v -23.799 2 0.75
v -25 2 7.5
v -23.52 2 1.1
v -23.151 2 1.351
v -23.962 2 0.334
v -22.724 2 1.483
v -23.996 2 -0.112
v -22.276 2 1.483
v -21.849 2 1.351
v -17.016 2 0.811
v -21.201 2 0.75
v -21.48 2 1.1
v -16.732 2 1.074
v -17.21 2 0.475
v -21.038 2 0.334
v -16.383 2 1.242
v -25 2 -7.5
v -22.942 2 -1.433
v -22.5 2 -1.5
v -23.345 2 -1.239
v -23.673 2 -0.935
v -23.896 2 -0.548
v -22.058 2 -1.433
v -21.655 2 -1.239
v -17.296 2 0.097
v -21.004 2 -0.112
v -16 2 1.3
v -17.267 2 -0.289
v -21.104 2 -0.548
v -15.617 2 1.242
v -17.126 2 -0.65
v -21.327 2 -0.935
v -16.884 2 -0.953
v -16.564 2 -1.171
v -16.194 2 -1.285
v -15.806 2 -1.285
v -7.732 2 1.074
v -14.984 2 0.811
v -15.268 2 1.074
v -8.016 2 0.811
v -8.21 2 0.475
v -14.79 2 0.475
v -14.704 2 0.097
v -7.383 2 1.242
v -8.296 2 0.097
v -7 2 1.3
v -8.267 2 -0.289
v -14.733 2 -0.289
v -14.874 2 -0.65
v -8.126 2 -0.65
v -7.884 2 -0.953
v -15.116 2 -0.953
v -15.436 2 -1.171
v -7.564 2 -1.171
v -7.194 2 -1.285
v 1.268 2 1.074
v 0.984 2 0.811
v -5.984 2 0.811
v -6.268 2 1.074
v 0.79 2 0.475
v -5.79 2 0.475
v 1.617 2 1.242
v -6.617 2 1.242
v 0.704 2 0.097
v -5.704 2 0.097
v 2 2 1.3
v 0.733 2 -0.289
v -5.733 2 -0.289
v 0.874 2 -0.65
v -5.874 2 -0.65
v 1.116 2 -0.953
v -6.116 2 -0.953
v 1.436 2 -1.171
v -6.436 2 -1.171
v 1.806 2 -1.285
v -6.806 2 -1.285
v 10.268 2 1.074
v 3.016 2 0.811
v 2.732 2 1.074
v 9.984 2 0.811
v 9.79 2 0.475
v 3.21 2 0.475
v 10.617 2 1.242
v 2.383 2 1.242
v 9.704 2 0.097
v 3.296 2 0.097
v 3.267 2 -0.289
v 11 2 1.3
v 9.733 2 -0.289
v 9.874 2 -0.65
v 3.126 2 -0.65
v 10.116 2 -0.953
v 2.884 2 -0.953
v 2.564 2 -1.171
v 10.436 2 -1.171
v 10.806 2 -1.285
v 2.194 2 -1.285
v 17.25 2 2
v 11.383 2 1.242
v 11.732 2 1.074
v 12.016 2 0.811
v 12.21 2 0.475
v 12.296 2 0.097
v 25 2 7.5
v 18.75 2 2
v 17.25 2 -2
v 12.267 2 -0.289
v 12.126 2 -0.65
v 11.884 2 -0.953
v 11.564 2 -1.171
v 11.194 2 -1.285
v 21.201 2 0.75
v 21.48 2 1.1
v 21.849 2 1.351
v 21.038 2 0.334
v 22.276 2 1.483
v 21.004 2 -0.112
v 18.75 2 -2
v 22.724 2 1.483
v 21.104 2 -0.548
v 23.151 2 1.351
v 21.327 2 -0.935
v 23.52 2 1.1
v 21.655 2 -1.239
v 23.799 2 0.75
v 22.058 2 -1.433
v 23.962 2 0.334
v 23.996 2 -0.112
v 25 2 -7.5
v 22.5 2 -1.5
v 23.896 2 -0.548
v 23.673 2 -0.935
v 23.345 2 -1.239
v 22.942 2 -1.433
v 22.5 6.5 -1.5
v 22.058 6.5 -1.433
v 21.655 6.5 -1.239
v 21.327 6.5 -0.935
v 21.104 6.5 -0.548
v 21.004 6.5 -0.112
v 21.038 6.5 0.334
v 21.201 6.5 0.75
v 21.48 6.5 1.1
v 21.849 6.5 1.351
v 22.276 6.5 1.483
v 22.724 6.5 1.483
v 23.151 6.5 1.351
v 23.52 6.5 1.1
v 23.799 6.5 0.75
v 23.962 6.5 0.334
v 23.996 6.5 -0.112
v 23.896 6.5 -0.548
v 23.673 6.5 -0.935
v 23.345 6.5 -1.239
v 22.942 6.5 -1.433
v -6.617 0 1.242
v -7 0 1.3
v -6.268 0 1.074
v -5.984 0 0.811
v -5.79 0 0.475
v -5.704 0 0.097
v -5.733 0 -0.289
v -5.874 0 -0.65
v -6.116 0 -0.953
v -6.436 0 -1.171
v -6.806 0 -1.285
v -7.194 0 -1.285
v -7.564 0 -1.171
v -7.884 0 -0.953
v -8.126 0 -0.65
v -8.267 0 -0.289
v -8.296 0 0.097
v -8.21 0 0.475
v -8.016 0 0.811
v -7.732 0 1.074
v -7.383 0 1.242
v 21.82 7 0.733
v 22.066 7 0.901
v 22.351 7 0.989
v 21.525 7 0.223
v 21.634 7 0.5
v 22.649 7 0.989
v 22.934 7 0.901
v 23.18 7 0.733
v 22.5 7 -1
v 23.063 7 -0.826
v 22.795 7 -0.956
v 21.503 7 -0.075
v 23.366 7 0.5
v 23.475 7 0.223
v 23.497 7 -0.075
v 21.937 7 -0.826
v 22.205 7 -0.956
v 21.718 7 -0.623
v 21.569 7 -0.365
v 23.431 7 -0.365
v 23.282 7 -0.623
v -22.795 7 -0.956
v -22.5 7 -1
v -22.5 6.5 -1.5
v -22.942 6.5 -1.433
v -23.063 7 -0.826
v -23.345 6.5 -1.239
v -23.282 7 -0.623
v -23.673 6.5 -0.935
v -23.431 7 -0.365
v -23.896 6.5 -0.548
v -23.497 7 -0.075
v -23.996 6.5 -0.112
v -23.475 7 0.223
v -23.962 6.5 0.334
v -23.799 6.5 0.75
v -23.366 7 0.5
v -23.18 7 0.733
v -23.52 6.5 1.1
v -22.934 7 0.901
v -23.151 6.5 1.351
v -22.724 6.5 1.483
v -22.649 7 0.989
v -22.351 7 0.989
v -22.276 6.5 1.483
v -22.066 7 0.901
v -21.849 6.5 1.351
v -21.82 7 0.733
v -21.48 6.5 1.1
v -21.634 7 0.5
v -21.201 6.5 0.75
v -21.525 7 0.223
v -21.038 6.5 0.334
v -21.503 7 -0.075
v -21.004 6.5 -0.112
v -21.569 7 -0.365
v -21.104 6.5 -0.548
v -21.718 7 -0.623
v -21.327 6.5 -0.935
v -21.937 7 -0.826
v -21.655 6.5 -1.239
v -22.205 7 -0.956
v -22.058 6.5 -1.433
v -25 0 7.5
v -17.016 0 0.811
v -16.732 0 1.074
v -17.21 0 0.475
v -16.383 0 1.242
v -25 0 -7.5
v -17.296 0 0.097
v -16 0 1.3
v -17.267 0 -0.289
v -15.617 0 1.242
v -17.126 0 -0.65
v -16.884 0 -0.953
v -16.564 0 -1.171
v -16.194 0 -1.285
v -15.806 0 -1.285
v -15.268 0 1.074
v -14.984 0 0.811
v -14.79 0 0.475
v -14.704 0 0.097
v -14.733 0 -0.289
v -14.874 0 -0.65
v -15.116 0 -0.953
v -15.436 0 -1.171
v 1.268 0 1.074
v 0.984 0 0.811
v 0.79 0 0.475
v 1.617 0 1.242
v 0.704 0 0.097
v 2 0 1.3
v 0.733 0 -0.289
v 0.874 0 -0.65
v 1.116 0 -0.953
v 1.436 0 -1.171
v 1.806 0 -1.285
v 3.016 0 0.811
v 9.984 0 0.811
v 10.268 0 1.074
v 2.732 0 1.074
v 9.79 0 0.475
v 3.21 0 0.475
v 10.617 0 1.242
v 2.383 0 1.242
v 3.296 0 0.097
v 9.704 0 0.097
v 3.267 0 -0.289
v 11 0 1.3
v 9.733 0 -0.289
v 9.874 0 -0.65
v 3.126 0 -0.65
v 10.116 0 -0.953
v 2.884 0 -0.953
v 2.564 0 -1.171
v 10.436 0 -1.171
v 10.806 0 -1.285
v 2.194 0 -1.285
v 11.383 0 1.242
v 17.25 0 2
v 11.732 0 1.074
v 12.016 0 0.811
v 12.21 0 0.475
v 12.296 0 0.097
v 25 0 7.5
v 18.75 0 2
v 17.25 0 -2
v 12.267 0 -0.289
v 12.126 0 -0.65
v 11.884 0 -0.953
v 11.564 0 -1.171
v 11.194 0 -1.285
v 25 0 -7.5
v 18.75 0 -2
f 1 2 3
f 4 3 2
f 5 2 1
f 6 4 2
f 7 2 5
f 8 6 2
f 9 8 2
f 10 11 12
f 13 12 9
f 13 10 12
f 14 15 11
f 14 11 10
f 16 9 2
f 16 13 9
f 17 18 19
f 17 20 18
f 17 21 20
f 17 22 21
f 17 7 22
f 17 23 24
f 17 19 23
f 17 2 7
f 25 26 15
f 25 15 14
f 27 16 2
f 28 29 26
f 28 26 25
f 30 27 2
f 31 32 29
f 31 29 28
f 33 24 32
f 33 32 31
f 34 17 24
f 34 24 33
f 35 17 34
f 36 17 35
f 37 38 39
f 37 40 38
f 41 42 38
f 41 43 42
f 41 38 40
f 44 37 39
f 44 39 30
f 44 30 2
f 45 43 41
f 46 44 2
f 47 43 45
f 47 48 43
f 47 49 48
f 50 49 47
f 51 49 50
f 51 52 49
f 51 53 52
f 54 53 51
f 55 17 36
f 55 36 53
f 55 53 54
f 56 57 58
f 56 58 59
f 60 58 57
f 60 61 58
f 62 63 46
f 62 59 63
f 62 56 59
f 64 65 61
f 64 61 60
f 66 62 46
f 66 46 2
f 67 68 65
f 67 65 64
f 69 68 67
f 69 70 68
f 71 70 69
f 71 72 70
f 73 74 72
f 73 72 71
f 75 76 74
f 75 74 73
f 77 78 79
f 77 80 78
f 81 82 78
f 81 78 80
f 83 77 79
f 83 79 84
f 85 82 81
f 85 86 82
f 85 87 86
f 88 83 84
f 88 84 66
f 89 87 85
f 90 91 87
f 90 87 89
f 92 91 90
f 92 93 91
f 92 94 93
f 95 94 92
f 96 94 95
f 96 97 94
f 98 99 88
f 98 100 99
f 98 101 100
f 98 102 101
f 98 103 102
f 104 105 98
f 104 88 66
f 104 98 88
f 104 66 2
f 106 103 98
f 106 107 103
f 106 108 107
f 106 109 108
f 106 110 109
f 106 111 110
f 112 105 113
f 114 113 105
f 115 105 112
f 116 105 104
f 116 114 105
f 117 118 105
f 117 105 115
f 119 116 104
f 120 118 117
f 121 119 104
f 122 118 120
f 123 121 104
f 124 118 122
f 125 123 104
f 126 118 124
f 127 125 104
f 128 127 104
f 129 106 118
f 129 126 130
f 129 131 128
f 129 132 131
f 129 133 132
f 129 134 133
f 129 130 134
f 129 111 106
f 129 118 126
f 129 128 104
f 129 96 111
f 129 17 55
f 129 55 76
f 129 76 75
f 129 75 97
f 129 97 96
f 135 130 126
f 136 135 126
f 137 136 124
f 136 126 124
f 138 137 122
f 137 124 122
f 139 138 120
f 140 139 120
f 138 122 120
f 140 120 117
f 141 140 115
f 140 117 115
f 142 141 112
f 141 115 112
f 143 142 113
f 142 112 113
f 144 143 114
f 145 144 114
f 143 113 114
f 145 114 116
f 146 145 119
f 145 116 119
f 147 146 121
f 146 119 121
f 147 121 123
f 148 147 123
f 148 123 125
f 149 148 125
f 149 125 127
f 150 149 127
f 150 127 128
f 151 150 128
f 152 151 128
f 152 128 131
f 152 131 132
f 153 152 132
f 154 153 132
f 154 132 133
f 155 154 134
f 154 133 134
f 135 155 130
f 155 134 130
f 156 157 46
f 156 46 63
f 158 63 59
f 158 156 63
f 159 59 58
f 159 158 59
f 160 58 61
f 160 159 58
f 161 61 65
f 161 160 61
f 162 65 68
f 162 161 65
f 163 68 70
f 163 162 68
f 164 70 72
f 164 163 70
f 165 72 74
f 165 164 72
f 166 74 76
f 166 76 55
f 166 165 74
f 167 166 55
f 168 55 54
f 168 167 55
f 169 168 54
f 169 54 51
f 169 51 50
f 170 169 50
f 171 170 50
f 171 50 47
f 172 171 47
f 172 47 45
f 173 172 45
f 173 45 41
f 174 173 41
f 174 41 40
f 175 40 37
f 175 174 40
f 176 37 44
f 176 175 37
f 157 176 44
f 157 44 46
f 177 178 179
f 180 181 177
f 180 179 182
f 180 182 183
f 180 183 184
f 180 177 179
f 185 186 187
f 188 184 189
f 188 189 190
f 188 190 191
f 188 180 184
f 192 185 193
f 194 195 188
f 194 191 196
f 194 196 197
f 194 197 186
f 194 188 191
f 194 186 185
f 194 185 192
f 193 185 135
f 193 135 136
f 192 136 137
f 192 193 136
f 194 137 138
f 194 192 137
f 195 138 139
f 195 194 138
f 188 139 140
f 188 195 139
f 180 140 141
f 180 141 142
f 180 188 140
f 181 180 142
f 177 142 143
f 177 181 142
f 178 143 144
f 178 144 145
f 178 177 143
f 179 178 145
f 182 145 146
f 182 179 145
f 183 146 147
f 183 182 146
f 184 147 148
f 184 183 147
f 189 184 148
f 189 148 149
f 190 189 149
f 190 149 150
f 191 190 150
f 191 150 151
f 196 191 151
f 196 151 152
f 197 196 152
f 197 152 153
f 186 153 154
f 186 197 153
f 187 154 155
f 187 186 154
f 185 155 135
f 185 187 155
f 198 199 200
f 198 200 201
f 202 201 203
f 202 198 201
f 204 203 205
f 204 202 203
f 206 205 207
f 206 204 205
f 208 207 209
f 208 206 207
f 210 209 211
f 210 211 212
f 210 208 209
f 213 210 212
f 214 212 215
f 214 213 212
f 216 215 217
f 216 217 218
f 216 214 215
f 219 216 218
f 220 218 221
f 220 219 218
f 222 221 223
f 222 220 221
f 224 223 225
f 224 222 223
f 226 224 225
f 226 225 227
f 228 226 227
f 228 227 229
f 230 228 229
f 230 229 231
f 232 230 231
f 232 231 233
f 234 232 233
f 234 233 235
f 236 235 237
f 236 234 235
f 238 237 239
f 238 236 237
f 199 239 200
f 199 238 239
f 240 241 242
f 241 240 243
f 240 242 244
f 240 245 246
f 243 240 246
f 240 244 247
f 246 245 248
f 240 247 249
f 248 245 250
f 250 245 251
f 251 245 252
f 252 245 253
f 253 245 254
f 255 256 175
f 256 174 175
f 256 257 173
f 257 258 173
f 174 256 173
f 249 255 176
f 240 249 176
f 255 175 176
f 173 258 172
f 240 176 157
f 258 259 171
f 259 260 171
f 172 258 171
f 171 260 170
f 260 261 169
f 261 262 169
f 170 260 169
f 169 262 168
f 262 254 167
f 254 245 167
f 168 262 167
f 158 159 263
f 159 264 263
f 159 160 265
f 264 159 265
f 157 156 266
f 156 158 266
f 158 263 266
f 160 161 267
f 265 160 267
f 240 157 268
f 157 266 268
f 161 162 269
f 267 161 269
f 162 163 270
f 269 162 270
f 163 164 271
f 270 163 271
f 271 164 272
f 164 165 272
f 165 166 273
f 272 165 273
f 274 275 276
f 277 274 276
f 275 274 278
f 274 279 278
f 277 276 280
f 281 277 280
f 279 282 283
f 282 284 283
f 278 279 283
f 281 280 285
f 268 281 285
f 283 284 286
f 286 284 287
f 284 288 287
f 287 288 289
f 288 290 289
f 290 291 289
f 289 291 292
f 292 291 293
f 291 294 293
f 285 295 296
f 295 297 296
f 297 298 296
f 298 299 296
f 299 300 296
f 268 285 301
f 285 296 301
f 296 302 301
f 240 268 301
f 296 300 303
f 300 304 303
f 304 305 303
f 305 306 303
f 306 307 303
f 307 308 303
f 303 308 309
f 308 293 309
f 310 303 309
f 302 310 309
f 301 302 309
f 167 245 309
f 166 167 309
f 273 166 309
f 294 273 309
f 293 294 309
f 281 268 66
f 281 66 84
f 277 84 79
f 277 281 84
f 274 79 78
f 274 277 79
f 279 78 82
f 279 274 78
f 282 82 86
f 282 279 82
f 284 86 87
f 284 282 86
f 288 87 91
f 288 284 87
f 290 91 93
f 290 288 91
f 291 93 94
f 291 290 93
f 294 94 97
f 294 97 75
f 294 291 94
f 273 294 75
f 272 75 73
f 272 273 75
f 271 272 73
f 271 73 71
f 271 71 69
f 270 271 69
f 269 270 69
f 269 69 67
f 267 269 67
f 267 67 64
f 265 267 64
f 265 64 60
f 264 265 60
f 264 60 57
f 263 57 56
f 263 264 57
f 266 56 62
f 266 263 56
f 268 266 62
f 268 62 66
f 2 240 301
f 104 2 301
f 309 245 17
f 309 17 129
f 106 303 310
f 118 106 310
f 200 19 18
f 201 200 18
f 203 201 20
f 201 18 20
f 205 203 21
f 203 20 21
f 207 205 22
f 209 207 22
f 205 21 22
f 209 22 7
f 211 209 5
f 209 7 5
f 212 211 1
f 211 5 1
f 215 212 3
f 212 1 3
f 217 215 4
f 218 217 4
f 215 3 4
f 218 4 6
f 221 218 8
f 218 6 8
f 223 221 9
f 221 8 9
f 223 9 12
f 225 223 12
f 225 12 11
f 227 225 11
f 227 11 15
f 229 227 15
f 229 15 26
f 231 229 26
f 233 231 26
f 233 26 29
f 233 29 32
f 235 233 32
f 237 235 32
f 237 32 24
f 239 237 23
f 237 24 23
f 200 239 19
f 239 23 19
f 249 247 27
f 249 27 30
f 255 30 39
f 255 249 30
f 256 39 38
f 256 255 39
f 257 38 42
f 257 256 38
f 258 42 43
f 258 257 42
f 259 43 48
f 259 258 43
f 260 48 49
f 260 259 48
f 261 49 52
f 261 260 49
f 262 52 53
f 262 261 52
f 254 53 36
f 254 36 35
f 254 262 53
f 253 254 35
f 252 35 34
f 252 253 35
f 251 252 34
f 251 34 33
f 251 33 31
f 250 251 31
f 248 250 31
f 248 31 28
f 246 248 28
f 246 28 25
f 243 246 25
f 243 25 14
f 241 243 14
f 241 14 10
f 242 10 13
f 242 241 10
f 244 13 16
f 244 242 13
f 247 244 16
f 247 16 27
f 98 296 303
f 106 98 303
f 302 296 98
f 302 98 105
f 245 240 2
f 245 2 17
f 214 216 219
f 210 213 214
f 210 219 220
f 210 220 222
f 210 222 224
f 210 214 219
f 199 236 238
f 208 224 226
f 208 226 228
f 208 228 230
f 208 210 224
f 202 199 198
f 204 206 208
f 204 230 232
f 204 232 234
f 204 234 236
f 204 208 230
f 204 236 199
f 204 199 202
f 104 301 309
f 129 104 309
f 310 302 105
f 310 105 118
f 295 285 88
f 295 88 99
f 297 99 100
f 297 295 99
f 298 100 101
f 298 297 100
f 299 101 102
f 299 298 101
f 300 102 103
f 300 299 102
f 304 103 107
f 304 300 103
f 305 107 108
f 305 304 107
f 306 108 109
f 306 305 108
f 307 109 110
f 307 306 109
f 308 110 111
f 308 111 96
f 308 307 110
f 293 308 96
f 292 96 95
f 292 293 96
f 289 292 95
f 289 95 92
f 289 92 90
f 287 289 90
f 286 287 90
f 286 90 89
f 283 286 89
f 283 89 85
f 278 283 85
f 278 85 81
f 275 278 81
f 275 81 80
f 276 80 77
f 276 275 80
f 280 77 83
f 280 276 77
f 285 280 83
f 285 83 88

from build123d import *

# Parameters (mm, degrees)
CROQUIS1_W              = 50
CROQUIS1_H              = 15
CROQUIS1_R              = 1.3
CROQUIS1_W_2            = 1.5
CROQUIS1_H_2            = 4
SALIENTE_EXTRUIR1_DEPTH = 2
CROQUIS2_R              = 1.5
SALIENTE_EXTRUIR2_DEPTH = 5
CHAFL_N1_SIZE           = 0.5
CHAFL_N2_SIZE           = 0.5


with BuildPart() as part:
    # Croquis1 → Saliente-Extruir1 (new body)
    with BuildSketch(Plane(origin=(0, 0, 0), x_dir=(1, 0, 0), z_dir=(0, 1, 0))):
        Rectangle(CROQUIS1_W, CROQUIS1_H)
        with Locations(Location((-16, 0, 0), (0, 0, 270))):
            Circle(CROQUIS1_R, mode=Mode.SUBTRACT)
        with Locations(Location((-7, 0, 0), (0, 0, 270))):
            Circle(CROQUIS1_R, mode=Mode.SUBTRACT)
        with Locations(Location((2, 0, 0), (0, 0, 270))):
            Circle(CROQUIS1_R, mode=Mode.SUBTRACT)
        with Locations(Location((11, 0, 0), (0, 0, 270))):
            Circle(CROQUIS1_R, mode=Mode.SUBTRACT)
        with Locations((18, 0)):
            Rectangle(CROQUIS1_W_2, CROQUIS1_H_2, mode=Mode.SUBTRACT)
    extrude(amount=SALIENTE_EXTRUIR1_DEPTH)

    # Croquis2 → Saliente-Extruir2 (add)
    with BuildSketch(Plane(origin=(0, 2, 0), x_dir=(1, 0, 0), z_dir=(0, 1, 0))):
        with Locations(Location((-22.5, 0, 0), (0, 0, 90))):
            Circle(CROQUIS2_R)
        with Locations(Location((22.5, 0, 0), (0, 0, 90))):
            Circle(CROQUIS2_R)
    extrude(amount=SALIENTE_EXTRUIR2_DEPTH)

    # Chaflán1
    chafl_n1_edges = [part.edges().sort_by_distance(p)[0] for p in [
        (-22.5, 7, 1.5),
    ]]
    chamfer(chafl_n1_edges, length=CHAFL_N1_SIZE)

    # Chaflán2
    chafl_n2_edges = [part.edges().sort_by_distance(p)[0] for p in [
        (22.5, 7, 1.5),
    ]]
    chamfer(chafl_n2_edges, length=CHAFL_N2_SIZE)


solid = part.part
